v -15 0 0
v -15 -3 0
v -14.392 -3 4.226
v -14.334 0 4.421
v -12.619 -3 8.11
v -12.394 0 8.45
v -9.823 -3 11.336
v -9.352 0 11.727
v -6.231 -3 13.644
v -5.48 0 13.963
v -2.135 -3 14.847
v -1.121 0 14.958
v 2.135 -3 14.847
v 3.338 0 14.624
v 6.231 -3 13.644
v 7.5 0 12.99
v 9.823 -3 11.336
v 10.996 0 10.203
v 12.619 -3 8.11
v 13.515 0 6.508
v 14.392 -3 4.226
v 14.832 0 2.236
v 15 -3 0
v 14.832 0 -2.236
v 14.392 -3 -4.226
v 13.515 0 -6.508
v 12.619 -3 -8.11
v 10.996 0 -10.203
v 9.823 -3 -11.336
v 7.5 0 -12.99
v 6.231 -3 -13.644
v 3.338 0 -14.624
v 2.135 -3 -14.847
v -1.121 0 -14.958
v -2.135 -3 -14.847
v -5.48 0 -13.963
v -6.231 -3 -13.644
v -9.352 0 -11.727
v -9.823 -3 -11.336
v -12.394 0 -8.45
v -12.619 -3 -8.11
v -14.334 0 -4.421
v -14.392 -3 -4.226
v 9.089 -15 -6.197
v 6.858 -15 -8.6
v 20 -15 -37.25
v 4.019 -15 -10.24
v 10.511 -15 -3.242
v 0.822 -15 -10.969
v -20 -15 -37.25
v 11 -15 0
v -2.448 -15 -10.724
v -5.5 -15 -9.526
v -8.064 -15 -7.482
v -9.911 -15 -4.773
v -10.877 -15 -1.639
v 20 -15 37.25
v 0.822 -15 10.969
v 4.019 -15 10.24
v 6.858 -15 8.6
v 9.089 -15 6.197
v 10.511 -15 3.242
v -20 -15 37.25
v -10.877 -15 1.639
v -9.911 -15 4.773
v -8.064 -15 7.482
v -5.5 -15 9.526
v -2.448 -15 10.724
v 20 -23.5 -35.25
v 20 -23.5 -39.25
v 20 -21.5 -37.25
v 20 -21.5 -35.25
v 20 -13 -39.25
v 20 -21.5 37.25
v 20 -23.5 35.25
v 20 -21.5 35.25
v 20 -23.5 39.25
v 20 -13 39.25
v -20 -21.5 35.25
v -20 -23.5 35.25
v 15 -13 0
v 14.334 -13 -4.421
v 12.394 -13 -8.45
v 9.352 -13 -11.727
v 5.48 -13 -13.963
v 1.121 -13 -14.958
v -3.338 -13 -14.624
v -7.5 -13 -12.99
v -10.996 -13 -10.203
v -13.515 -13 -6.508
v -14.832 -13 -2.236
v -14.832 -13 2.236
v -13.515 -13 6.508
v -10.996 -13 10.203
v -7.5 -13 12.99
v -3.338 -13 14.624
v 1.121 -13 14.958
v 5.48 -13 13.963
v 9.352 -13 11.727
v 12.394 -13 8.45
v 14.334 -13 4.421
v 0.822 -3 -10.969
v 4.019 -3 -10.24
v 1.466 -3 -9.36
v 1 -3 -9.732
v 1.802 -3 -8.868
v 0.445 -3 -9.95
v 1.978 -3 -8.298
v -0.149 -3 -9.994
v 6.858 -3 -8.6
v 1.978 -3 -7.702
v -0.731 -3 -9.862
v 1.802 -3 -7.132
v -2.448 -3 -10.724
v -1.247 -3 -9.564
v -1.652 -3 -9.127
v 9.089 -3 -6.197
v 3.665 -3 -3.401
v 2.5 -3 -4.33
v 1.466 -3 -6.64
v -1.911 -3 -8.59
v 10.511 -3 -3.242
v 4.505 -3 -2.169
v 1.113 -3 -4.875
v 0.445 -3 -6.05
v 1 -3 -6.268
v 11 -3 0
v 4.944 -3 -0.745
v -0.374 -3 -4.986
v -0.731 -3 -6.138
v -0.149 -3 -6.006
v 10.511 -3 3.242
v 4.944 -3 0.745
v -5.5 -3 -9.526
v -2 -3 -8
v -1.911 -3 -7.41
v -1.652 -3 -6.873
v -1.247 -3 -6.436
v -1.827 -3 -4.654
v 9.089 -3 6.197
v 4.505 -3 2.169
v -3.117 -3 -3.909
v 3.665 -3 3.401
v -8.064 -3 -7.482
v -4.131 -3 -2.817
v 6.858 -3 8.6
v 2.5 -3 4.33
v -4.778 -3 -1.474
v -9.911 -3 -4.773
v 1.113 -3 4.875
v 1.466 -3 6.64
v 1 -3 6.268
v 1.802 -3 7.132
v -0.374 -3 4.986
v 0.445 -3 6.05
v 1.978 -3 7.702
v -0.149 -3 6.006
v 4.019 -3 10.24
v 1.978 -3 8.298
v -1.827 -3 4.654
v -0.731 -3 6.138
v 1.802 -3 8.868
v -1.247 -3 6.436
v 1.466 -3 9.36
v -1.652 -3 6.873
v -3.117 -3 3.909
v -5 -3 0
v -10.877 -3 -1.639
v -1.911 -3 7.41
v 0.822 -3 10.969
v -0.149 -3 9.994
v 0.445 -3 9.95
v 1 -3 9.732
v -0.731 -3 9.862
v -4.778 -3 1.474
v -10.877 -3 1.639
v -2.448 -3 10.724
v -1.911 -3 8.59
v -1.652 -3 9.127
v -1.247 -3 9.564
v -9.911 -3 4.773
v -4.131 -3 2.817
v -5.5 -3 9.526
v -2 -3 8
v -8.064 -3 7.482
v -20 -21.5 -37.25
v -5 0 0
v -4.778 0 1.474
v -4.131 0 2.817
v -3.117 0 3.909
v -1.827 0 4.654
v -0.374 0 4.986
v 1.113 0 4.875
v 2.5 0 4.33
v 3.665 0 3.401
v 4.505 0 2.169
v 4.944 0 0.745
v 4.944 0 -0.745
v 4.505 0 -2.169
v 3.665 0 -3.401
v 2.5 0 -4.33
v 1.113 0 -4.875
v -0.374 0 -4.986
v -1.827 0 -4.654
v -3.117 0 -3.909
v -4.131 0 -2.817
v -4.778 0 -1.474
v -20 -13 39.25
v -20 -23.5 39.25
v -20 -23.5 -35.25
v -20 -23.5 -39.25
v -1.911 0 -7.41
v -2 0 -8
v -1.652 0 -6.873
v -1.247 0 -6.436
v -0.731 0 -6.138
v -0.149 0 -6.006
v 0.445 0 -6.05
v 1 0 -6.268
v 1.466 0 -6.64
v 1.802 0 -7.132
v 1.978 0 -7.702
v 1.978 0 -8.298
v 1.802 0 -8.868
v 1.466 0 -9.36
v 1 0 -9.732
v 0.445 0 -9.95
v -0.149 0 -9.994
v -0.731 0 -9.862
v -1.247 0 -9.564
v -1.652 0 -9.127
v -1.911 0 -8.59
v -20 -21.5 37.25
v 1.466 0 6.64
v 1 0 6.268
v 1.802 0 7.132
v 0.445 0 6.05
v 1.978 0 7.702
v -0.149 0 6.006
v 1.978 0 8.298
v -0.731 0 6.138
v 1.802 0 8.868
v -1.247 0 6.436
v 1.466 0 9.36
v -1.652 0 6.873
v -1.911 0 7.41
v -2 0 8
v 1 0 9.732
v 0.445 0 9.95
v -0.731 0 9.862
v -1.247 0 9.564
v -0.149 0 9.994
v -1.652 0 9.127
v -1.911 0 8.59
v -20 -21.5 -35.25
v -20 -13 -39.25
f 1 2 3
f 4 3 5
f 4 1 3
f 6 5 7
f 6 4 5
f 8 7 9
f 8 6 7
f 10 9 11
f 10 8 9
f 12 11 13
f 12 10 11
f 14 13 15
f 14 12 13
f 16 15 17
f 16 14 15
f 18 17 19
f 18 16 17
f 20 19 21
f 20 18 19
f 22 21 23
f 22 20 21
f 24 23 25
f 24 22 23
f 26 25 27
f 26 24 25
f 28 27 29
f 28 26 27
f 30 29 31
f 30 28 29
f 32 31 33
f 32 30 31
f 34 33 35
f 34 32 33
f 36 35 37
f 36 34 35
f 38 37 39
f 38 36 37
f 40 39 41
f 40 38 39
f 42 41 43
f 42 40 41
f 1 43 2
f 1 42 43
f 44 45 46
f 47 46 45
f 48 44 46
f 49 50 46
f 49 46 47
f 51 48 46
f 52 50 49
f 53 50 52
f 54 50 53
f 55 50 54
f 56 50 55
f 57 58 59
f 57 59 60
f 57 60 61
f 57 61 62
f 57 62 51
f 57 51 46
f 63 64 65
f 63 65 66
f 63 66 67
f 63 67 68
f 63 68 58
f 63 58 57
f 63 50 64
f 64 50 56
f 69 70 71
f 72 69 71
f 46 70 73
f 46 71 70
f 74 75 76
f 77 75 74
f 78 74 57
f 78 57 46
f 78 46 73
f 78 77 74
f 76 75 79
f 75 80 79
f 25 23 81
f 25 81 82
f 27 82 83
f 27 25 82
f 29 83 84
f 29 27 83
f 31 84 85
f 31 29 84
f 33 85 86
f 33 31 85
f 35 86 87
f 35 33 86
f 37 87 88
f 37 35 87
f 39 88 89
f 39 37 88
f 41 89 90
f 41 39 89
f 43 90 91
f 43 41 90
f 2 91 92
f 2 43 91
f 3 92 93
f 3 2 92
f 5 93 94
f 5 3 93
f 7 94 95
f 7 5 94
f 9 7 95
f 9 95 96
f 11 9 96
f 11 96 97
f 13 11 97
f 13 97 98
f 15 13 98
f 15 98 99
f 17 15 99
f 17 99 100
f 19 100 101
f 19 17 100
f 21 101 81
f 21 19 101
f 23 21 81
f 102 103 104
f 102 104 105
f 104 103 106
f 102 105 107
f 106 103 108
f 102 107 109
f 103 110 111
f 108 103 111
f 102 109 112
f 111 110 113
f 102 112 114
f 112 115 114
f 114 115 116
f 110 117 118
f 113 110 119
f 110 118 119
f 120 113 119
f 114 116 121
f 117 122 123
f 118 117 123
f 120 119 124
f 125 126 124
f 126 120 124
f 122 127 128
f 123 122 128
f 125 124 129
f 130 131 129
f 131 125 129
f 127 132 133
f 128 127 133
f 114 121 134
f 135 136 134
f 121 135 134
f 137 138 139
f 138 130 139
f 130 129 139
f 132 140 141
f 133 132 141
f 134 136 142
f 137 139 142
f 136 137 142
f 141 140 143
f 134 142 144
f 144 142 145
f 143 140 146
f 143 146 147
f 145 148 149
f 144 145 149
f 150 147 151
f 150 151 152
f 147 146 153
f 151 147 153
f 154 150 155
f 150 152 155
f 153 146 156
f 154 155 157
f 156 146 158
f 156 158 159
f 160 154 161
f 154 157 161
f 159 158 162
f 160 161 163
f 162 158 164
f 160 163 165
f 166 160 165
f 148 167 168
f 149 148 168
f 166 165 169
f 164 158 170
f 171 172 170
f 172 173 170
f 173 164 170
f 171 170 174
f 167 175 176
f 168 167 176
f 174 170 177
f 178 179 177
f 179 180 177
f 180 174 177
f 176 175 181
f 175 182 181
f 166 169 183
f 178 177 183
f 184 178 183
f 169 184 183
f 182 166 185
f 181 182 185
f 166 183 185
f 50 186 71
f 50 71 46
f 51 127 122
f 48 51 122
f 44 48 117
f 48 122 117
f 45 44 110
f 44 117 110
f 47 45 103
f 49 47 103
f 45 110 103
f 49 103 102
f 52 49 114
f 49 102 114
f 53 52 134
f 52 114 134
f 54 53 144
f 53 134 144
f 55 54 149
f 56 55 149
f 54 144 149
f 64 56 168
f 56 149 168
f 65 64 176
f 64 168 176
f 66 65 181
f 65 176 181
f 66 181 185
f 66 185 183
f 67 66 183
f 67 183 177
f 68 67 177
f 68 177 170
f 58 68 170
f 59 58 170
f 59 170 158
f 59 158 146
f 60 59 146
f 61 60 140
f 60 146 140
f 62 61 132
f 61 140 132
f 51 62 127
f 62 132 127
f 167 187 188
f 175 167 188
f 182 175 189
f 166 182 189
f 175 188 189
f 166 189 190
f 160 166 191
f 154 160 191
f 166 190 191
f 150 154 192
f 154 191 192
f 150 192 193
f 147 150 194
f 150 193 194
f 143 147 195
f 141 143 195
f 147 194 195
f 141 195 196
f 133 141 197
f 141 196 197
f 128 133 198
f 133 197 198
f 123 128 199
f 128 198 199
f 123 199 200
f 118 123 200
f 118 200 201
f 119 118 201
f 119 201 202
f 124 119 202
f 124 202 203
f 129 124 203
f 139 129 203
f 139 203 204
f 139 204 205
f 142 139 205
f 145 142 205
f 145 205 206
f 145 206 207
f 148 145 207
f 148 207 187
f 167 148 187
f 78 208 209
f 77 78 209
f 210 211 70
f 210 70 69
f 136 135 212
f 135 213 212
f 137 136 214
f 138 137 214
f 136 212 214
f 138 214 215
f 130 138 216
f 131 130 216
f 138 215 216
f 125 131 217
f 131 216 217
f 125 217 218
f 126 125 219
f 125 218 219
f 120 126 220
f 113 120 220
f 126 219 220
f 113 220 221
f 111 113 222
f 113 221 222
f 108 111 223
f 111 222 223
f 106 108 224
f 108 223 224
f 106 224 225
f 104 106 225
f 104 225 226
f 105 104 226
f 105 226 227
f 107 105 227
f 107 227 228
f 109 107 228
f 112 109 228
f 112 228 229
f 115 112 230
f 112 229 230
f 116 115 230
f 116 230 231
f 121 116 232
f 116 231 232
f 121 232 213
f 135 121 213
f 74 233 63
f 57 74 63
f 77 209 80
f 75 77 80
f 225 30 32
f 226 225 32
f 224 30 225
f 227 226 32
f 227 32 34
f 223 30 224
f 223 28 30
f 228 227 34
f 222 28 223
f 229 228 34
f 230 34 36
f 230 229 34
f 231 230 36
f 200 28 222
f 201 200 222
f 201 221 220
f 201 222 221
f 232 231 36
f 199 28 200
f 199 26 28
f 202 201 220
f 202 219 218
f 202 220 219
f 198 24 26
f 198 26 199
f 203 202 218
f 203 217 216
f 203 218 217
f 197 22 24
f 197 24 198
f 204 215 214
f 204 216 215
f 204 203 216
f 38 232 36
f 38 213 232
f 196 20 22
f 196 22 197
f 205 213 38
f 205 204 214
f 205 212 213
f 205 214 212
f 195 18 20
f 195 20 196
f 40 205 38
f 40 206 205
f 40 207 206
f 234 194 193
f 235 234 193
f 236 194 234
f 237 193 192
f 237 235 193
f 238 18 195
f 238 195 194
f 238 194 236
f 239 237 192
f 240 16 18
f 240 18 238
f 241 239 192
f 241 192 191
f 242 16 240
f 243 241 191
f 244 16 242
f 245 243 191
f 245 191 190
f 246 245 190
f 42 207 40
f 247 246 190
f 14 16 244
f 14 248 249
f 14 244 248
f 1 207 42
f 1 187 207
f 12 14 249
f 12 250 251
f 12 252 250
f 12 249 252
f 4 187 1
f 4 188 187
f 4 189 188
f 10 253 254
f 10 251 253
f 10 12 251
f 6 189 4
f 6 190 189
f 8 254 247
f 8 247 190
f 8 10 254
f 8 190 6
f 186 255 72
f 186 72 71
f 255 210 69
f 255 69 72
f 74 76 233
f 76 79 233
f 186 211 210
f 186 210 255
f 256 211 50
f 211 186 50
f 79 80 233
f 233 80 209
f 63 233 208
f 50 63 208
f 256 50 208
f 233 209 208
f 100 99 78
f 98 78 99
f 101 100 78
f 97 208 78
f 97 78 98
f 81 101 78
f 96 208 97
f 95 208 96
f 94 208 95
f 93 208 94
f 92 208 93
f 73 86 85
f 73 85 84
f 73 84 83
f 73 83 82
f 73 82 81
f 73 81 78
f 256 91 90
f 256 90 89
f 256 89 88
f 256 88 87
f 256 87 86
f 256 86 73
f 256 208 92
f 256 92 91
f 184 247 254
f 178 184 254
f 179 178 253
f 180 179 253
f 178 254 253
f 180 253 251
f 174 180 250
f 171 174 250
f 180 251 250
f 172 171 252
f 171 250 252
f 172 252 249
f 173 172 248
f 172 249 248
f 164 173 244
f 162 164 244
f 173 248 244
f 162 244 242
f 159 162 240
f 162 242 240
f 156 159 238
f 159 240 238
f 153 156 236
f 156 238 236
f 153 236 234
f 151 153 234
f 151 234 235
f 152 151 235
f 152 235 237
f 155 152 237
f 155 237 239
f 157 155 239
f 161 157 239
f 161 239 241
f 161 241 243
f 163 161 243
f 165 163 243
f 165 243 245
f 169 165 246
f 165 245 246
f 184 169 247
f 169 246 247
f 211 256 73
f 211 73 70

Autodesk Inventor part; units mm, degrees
ref_plane "YZ Plane" through (0, 0, 0) normal (1, 0, 0) x (0, 1, 0)
ref_plane "XZ Plane" through (0, 0, 0) normal (0, 1, 0) x (-1, 0, 0)
ref_plane "XY Plane" through (0, 0, 0) normal (0, 0, 1) x (1, 0, 0)
sketch "Boceto1" plane through (0, 0, 0) normal (0, 1, 0) x (-1, 0, 0)
  circle A0 centre (0, 0) radius 15
  circle A1 centre (0, 0) radius 5
  circle A2 centre (0, 8) radius 2
  circle A3 centre (0, -8) radius 2
  dimension "d0" = 30
  dimension "d1" = 10
  dimension "d2" = 4
  dimension "d3" = 8
  dimension "d4" = 4
  dimension "d5" = 8
extrude "Extrusión1" add sketch "Boceto1" against normal blind 3
sketch "Boceto2" plane through (0, -3, 0) normal (0, -1, 0) x (1, 0, 0)
  circle A0 centre (0, 0) radius 11
  circle A1 centre (0, 0) radius 15
  dimension "d8" = 22
extrude "Extrusión2" add sketch "Boceto2" along normal blind 10
sketch "Boceto5" plane through (0, 0, 0) normal (1, 0, 0) x (0, 1, 0)
  line L0 (-15, 0) -> (-15, 37.25)
  line L1 (-32.5779, 0) -> (6.5779, 0) construction
  line L2 (-13, 39.25) -> (-13, 0)
  line L3 (-13, 39.25) -> (-23.5, 39.25)
  line L4 (-23.5, 39.25) -> (-23.5, 35.25)
  line L5 (-23.5, 35.25) -> (-21.5, 35.25)
  line L6 (-21.5, 35.25) -> (-21.5, 37.25)
  line L7 (-21.5, 37.25) -> (-15, 37.25)
  line L8 (-15, 0) -> (-15, -37.25)
  line L9 (-13, -39.25) -> (-13, 0)
  line L10 (-13, -39.25) -> (-23.5, -39.25)
  line L11 (-23.5, -39.25) -> (-23.5, -35.25)
  line L12 (-23.5, -35.25) -> (-21.5, -35.25)
  line L13 (-21.5, -35.25) -> (-21.5, -37.25)
  line L14 (-21.5, -37.25) -> (-15, -37.25)
  point P0 (0, 0)
  dimension "d27" = 10.5
  dimension "d28" = 4
  dimension "d29" = 2
  dimension "d30" = 2
extrude "Extrusión5" add sketch "Boceto5" along normal mid plane 40
sketch "Boceto6" plane through (0, -13, 0) normal (0, 1, 0) x (1, 0, 0)
  circle A0 centre (0, 0) radius 11 projected
  point P0 (0, 0)
extrude "Extrusión6" cut sketch "Boceto6" against normal through all
properties part number "motor_prueba_3DPrint"
